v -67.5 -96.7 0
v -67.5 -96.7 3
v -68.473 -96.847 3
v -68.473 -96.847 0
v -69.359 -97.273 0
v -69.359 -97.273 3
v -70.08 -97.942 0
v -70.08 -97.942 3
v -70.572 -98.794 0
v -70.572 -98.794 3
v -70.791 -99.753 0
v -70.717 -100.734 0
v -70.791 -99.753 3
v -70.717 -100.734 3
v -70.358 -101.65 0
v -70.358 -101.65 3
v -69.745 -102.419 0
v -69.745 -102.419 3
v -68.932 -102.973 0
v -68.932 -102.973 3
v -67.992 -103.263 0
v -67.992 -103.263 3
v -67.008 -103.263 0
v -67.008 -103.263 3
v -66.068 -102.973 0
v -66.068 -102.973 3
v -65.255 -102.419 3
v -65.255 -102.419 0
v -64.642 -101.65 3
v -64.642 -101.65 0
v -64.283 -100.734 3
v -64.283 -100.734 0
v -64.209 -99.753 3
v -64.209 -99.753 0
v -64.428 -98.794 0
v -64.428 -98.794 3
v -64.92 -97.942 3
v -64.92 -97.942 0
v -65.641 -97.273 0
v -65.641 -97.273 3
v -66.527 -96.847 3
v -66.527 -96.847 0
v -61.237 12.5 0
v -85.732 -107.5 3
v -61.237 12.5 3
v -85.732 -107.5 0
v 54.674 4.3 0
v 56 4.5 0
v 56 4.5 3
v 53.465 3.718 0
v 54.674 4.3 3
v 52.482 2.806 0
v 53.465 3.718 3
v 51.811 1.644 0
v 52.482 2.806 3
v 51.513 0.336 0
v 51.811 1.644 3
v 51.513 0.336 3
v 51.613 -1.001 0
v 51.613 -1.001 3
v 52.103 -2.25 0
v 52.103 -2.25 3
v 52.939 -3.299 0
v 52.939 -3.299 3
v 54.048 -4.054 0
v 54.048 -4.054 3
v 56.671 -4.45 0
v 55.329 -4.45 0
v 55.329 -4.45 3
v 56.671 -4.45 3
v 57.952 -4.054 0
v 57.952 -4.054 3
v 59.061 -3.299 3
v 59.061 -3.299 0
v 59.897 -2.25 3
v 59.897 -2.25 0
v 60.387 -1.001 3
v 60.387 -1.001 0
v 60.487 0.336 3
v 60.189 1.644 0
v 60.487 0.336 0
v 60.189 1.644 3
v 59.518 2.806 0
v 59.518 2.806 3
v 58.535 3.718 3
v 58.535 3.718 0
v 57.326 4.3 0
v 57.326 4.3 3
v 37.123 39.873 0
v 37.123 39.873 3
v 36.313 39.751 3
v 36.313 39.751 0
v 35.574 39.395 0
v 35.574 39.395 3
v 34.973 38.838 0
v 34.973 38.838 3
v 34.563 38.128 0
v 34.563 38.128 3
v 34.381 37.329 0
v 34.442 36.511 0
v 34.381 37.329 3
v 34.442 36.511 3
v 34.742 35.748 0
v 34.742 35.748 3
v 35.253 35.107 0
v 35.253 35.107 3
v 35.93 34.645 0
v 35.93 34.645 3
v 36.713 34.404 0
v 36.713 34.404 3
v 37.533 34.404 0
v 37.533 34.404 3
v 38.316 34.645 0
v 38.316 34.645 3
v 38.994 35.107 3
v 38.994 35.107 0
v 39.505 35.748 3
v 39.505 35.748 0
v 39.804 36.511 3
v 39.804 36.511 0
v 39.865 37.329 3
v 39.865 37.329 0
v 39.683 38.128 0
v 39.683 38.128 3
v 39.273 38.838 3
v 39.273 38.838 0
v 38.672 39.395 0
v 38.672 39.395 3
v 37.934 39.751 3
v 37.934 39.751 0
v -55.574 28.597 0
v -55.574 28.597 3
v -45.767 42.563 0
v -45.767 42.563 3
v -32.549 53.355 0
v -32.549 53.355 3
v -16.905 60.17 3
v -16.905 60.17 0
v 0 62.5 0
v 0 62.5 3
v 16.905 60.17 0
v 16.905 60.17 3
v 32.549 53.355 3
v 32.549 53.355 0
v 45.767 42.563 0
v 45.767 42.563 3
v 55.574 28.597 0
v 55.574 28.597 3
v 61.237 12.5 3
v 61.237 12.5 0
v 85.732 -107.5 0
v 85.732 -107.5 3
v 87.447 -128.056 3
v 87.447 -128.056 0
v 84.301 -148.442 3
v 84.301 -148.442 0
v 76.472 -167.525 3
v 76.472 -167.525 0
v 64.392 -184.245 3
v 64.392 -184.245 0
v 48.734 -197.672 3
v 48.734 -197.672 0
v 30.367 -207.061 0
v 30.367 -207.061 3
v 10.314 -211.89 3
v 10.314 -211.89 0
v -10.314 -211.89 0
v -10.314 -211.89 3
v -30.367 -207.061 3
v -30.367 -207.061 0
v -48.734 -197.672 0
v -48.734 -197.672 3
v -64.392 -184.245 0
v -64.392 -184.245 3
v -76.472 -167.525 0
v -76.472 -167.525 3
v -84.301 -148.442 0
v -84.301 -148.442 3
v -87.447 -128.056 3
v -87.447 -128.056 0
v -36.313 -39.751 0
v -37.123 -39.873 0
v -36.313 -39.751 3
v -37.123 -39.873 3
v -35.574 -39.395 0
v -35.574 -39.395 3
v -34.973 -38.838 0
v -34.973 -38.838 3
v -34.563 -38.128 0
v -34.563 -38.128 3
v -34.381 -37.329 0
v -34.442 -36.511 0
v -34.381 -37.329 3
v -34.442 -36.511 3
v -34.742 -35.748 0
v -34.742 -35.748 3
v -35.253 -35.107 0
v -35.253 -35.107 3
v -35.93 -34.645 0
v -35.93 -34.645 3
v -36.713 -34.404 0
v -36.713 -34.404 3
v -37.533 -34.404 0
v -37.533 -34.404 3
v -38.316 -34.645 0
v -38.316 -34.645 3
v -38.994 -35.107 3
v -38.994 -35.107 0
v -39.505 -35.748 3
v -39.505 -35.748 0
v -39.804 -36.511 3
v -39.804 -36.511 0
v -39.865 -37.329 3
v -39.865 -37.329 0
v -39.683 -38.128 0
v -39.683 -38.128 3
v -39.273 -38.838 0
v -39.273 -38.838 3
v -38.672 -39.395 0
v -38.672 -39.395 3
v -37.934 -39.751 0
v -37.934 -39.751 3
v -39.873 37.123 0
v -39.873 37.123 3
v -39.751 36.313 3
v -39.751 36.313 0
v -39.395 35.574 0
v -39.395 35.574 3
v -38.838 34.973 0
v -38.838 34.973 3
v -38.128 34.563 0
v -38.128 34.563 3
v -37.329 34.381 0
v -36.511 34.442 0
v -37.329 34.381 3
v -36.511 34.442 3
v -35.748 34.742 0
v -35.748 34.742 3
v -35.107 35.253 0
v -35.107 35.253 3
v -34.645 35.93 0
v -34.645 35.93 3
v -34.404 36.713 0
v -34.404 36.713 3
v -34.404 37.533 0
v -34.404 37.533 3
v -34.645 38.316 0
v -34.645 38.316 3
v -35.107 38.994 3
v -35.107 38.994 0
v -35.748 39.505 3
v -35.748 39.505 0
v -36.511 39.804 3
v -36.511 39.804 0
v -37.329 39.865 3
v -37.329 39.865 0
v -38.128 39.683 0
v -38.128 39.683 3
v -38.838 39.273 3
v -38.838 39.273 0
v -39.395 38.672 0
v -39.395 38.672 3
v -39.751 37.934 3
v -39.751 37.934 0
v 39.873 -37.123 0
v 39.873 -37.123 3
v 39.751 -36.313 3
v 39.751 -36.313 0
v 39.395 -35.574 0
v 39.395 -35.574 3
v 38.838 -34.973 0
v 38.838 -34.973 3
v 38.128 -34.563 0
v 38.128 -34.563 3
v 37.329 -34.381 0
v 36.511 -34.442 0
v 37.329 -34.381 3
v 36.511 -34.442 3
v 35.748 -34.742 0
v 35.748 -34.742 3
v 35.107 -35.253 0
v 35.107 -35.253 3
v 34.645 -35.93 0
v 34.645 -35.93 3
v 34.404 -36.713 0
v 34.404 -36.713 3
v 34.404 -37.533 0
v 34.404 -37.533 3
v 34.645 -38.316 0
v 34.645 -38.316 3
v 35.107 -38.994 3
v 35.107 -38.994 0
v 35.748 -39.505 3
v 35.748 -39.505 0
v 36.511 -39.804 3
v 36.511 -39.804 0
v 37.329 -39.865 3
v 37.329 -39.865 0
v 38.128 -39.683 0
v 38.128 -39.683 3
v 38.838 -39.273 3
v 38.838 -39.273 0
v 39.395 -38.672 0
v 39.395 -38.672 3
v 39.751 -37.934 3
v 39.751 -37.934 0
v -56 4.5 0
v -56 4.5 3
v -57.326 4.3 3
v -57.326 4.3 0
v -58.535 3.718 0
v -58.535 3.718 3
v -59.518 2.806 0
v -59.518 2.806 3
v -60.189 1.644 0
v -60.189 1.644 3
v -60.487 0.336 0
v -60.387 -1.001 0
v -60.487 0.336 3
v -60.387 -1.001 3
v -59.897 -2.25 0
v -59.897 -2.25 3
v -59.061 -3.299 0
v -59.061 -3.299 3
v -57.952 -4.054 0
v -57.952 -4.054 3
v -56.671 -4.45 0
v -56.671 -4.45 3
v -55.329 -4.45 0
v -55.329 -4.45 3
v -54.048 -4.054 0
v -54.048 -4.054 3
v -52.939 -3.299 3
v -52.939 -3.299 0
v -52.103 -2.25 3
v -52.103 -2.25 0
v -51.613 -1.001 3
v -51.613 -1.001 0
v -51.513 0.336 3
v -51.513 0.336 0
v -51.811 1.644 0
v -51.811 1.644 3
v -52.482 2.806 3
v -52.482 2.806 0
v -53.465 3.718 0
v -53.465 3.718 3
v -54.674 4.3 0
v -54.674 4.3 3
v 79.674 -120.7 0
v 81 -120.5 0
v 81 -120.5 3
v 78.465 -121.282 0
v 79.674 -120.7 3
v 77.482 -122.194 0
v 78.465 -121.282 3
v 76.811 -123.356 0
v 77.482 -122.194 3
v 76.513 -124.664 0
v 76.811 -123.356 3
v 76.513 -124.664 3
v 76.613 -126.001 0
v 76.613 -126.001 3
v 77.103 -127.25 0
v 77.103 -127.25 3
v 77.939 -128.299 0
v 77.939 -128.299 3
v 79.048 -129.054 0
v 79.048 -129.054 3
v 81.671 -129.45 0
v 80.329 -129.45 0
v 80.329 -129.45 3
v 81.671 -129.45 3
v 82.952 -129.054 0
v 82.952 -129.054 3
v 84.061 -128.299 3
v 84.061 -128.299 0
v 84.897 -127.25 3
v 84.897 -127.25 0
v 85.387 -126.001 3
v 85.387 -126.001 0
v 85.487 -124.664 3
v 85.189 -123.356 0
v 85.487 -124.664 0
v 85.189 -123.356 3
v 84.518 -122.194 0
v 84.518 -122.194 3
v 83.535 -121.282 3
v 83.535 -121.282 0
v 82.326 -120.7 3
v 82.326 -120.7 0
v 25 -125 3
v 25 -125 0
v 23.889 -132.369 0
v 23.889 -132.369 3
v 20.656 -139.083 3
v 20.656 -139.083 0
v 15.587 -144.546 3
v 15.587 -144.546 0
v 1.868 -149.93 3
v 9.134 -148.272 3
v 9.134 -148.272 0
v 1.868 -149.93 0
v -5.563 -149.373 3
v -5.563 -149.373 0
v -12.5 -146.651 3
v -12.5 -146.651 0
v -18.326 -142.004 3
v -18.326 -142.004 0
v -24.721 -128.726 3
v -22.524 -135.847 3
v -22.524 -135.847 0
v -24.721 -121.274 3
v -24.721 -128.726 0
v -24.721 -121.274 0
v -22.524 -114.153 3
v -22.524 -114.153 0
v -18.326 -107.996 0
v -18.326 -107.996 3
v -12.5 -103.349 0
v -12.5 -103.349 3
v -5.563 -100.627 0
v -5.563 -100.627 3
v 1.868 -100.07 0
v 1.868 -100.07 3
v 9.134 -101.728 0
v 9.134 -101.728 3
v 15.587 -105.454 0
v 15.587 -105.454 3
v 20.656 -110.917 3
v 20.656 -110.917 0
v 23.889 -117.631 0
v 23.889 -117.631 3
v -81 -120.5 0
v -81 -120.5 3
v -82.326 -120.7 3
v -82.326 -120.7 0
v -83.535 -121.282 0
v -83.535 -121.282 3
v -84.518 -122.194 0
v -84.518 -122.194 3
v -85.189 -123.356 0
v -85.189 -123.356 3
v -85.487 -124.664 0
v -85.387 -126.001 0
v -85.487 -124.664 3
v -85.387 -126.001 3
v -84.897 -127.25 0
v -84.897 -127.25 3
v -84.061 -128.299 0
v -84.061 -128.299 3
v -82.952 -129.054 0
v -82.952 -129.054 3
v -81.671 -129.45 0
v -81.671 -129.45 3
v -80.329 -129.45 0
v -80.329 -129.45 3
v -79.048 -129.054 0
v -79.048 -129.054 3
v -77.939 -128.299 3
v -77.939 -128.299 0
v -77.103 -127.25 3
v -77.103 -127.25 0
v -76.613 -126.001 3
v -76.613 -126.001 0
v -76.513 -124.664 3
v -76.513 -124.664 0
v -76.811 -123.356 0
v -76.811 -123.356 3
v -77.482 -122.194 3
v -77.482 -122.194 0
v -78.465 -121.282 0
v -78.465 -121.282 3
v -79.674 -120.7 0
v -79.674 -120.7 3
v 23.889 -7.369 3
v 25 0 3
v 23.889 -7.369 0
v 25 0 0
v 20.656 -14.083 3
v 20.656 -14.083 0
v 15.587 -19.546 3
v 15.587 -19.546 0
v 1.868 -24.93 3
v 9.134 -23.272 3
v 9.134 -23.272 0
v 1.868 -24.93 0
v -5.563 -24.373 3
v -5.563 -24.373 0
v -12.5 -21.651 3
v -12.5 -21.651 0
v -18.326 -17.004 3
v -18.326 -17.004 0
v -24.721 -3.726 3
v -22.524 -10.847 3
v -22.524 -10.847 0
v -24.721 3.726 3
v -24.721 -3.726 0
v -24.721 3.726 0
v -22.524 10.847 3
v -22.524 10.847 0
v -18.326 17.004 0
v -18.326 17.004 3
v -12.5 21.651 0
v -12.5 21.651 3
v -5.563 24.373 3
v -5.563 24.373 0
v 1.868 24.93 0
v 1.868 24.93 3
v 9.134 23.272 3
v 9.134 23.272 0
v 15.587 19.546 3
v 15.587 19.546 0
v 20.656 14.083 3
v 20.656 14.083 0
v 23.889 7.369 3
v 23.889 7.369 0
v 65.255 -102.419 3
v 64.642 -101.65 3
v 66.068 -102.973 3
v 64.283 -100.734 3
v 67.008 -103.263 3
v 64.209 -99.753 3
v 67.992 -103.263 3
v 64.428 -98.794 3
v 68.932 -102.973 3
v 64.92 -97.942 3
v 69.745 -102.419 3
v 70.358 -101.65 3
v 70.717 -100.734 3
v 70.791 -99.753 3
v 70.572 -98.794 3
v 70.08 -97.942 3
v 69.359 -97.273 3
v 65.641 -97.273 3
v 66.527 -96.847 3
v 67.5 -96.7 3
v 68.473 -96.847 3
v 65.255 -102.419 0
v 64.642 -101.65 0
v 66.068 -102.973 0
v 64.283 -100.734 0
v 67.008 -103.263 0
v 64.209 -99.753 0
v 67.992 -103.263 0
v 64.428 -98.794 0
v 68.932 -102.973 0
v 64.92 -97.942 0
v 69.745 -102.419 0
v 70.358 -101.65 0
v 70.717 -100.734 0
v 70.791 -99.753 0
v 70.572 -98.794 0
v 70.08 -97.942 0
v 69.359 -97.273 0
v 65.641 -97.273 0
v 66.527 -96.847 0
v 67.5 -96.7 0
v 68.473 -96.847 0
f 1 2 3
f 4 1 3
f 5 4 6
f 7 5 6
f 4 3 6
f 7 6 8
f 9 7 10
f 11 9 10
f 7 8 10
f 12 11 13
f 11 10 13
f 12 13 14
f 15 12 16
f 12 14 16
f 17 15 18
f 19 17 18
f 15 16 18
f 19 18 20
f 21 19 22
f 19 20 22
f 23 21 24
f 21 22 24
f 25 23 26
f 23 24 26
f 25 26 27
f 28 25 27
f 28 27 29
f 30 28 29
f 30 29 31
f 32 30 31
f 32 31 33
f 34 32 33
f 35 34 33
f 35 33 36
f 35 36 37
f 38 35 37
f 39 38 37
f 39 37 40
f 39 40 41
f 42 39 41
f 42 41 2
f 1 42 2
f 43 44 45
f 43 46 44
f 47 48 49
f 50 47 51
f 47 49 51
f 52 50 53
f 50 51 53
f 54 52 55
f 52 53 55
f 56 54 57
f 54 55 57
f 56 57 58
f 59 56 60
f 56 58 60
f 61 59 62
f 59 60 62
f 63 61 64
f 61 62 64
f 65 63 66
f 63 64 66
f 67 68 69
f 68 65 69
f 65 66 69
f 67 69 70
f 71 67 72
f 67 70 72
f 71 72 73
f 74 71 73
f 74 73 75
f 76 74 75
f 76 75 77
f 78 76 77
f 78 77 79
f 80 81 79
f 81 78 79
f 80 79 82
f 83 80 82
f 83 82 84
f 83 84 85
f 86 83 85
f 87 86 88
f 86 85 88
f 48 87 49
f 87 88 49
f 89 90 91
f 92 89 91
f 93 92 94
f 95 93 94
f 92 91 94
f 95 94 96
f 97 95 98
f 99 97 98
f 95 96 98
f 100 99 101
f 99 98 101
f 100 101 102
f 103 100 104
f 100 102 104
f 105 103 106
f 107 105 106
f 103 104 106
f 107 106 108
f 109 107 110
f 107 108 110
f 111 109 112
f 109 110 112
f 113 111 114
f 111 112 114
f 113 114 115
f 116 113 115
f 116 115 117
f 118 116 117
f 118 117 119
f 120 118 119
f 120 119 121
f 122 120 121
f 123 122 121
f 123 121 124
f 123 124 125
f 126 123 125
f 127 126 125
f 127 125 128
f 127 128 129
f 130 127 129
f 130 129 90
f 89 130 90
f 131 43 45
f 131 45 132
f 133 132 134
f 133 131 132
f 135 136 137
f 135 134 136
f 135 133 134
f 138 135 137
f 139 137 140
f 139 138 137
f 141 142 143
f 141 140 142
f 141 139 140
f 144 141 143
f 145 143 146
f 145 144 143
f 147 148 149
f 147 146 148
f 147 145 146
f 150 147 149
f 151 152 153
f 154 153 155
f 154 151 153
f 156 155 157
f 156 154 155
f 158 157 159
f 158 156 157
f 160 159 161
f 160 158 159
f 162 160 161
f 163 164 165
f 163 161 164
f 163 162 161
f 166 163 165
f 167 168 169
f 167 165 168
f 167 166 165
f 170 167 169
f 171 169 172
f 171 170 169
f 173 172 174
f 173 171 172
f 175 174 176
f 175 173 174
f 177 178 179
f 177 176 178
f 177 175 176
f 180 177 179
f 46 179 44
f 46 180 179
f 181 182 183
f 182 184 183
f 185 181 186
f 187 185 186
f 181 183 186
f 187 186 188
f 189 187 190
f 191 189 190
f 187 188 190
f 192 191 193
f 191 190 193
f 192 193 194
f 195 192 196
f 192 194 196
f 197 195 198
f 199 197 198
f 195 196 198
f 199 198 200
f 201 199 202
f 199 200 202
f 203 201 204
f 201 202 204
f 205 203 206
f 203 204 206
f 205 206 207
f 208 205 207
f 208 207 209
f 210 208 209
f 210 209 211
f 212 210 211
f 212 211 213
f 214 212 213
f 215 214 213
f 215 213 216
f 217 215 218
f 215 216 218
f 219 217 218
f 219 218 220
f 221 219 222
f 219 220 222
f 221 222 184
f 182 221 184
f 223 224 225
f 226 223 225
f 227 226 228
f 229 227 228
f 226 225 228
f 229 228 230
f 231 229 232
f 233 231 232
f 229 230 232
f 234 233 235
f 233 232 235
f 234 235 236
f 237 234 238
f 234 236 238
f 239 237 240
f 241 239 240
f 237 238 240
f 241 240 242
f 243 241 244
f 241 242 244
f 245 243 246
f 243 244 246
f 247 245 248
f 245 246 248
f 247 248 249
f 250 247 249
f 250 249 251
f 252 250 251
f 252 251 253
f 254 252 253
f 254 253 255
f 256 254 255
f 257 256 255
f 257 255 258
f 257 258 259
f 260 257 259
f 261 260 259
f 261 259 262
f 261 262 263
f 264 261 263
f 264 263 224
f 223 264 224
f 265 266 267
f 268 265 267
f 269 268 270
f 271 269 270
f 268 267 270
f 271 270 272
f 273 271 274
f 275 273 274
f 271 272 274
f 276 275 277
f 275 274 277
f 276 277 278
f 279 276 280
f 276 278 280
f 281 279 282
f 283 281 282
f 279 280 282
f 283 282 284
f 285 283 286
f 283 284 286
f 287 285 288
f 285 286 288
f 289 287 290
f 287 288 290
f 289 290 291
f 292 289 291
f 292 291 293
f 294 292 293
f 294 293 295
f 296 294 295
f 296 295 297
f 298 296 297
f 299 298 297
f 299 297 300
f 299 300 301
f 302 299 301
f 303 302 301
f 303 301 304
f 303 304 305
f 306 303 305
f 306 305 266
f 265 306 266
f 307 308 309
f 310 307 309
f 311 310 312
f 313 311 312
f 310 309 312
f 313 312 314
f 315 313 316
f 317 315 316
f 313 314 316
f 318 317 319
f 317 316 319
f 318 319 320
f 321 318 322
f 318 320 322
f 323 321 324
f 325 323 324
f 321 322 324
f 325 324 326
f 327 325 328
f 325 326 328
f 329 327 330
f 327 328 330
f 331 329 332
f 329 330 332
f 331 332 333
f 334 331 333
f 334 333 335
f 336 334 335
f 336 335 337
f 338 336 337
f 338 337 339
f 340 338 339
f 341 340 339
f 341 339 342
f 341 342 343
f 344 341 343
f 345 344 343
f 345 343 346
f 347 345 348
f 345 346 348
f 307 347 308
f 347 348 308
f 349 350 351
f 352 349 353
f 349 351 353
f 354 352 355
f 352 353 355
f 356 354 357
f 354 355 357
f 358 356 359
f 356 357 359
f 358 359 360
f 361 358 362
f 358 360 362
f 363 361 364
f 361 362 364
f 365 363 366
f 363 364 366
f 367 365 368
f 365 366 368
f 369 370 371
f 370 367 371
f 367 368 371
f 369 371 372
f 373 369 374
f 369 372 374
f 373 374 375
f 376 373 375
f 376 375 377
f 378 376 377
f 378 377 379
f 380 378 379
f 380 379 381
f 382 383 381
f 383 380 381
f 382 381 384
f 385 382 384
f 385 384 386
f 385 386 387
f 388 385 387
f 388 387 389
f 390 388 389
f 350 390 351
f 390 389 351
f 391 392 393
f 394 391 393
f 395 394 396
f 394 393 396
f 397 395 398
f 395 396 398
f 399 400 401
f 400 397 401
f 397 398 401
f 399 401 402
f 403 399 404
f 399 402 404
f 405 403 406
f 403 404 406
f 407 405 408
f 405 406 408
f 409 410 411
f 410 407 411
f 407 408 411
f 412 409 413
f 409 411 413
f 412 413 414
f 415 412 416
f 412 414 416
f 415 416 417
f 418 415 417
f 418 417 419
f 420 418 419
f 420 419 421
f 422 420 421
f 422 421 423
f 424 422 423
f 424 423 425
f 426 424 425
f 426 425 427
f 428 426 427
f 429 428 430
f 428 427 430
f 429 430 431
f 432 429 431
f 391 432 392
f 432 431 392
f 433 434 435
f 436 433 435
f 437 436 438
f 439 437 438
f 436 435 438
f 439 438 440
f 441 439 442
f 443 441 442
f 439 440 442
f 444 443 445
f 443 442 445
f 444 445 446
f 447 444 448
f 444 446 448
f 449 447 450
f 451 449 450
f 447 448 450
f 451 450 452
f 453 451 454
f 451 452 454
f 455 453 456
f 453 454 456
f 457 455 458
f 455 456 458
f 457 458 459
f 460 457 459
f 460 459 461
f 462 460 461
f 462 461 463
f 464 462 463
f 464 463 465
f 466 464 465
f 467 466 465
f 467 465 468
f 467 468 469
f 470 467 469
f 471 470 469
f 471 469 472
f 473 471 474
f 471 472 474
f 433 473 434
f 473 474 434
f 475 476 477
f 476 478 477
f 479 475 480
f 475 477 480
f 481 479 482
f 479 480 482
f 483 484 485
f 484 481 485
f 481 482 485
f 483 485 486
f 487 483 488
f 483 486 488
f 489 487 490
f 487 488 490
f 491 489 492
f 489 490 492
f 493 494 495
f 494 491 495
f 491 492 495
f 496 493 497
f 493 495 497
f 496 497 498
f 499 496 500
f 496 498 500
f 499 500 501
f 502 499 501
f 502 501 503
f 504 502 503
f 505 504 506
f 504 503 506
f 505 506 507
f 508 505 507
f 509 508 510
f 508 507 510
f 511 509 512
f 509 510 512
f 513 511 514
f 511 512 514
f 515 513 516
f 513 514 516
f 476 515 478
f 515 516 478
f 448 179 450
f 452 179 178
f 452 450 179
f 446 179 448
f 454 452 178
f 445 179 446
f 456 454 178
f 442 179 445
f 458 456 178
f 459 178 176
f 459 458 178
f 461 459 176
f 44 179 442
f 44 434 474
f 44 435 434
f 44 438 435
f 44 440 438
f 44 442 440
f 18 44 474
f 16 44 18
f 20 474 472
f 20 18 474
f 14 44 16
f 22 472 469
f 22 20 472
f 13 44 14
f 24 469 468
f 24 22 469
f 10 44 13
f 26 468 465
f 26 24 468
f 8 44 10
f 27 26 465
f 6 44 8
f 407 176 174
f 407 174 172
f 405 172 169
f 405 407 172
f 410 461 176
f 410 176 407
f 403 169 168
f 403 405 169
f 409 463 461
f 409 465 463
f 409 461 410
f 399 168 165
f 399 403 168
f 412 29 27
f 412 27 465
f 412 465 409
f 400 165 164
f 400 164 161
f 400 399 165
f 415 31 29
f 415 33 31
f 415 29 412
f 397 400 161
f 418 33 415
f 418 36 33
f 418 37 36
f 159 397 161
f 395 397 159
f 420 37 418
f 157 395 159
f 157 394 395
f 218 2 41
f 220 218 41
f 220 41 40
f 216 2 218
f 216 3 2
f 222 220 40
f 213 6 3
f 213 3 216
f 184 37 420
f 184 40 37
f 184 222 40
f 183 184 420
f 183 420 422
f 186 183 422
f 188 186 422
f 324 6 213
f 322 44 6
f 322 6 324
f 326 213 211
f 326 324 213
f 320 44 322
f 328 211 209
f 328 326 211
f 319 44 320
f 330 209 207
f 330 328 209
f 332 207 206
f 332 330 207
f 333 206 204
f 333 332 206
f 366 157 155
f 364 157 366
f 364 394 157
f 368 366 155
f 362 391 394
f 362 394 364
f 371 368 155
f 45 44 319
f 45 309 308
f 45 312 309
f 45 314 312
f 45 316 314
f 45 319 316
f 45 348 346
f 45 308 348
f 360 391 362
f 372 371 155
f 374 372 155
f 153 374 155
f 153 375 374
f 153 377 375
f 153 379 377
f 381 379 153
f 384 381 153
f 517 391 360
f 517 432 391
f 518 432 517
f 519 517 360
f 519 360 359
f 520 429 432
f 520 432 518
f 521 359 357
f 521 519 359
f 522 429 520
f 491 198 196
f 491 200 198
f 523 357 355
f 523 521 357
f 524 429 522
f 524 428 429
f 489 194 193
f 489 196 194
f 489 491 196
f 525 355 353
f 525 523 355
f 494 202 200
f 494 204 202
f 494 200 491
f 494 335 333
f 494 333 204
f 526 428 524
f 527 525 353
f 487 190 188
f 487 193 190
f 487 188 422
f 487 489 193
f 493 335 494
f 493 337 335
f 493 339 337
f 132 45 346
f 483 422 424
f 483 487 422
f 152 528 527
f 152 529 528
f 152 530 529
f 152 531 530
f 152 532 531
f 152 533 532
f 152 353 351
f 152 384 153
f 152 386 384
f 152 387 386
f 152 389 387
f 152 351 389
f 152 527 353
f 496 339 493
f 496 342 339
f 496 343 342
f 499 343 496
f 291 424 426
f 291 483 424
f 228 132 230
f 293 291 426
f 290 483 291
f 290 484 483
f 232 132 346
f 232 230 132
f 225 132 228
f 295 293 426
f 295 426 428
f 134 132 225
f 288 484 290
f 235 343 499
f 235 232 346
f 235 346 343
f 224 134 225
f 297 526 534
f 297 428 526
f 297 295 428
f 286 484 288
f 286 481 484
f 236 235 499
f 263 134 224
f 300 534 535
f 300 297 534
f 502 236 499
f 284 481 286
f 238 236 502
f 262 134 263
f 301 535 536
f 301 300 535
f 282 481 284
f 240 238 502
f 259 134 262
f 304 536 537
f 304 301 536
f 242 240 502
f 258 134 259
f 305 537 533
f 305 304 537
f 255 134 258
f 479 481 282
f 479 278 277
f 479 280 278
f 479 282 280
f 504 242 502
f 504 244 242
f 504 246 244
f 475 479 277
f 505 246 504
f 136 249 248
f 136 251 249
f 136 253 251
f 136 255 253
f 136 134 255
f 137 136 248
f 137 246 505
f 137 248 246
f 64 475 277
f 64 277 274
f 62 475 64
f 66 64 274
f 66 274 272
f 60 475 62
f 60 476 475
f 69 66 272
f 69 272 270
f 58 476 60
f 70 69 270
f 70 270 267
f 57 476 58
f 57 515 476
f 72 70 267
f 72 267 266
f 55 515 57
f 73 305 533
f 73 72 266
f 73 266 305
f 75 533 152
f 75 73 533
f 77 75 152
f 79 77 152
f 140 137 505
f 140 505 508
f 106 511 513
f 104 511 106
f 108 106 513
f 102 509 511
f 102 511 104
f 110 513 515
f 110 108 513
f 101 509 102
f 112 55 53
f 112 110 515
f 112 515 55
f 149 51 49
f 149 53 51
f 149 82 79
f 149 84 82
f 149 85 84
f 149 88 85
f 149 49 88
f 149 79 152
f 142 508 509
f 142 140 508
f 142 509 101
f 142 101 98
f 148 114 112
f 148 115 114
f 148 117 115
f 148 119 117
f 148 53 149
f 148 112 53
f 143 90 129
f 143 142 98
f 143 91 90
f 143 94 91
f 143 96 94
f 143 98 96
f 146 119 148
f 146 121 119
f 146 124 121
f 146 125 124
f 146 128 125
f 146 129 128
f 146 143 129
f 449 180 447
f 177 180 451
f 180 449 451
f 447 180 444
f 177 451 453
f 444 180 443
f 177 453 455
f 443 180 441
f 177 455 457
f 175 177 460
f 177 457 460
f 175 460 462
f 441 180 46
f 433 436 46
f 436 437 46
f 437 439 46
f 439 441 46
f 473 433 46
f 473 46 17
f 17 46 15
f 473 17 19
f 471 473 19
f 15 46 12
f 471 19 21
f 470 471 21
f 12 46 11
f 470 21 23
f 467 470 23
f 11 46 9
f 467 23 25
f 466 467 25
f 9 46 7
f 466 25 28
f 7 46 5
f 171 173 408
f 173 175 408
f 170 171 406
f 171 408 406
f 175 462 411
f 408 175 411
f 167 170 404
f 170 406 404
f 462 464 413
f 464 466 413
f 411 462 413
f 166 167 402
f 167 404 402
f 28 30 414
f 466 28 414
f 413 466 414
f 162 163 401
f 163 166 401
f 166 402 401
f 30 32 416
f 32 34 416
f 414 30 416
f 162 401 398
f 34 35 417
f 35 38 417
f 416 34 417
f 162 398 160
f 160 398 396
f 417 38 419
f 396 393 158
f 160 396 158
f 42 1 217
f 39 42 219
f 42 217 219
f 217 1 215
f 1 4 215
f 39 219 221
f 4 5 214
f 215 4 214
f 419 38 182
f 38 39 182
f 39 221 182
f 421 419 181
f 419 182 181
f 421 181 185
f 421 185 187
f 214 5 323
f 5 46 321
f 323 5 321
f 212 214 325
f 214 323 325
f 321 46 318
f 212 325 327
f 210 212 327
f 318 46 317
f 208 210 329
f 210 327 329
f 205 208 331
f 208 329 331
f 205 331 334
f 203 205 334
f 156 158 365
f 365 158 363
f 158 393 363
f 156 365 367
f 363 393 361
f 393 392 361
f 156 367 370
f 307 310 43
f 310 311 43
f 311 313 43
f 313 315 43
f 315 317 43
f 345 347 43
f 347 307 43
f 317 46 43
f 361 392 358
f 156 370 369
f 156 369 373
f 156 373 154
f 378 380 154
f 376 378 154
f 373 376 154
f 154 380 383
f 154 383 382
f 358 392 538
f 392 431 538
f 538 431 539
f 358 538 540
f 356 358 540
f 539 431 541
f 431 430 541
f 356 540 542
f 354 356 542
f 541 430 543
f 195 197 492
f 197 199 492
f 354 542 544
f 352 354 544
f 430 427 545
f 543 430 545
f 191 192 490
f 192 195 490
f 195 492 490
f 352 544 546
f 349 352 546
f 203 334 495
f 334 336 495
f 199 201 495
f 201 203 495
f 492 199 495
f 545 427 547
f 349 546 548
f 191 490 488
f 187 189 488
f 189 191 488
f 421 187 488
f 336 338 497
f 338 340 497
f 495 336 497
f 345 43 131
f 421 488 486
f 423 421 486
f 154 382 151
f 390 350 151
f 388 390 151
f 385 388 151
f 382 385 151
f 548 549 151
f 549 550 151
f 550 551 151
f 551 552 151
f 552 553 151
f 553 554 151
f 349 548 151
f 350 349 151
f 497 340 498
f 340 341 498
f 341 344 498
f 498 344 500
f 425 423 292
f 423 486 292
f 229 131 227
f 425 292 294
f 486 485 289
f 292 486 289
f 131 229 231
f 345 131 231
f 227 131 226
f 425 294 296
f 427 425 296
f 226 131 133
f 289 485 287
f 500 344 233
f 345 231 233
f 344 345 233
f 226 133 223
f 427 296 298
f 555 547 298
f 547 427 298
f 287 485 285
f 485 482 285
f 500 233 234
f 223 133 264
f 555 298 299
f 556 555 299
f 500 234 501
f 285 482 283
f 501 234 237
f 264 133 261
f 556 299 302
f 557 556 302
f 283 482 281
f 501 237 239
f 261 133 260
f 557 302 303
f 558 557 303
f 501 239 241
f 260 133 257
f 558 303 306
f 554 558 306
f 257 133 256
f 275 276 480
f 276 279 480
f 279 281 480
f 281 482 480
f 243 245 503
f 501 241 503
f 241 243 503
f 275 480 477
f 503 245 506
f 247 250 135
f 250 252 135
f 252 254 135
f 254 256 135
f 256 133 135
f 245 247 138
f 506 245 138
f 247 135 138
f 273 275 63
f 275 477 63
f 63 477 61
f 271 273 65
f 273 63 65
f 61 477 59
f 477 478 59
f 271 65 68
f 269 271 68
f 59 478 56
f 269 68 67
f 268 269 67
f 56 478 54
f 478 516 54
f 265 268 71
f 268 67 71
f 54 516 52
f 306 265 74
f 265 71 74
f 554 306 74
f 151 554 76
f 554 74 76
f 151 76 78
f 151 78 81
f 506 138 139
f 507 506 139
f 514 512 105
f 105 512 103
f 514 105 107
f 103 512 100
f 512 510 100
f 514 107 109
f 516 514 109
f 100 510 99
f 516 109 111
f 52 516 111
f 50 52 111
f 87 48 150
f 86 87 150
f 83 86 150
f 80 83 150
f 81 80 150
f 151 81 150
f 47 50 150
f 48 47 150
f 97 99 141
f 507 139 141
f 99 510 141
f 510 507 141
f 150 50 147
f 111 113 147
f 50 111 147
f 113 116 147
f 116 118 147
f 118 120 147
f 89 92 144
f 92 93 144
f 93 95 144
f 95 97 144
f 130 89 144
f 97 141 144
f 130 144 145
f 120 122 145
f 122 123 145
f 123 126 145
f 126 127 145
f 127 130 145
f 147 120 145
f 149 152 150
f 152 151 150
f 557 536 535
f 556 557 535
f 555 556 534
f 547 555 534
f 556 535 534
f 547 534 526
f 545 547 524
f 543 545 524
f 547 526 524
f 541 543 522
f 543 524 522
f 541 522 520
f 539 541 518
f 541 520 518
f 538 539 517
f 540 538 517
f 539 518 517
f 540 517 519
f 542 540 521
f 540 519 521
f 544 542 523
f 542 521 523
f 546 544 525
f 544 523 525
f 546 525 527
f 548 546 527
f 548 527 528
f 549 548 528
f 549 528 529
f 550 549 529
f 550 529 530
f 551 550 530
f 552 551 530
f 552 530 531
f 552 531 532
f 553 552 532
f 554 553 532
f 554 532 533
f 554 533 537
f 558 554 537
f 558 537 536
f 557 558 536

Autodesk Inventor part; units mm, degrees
ref_plane "YZ Plane" through (0, 0, 0) normal (1, 0, 0) x (0, 1, 0)
ref_plane "XZ Plane" through (0, 0, 0) normal (0, 1, 0) x (-1, 0, 0)
ref_plane "XY Plane" through (0, 0, 0) normal (0, 0, 1) x (1, 0, 0)
sketch "Sketch1" plane through (0, 0, 0) normal (0, 0, 1) x (1, 0, 0)
  circle A0 centre (0, 0) radius 52.5 construction
  circle A1 centre (0, 0) radius 25
  circle A2 centre (0, 0) radius 62.5
  line L0 (0, 0) -> (0, 52.5) construction
  line L1 (0, 0) -> (37.1231, 37.1231) construction
  line L2 (0, 0) -> (0, -125) construction
  circle A3 centre (0, -125) radius 87.5
  line L3 (-85.7321, -107.5) -> (-61.2372, 12.5)
  line L4 (85.7321, -107.5) -> (61.2372, 12.5)
  circle A4 centre (0, -125) radius 25
  circle A5 centre (0, -125) radius 81 construction
  circle A6 centre (0, 0) radius 56 construction
  line L5 (0, 0) -> (-56, 0) construction
  line L6 (0, -125) -> (-81, -125) construction
  dimension "d31" = 162
  dimension "d32" = 112
  dimension "d0" = 105
  dimension "d1" = 50
  dimension "d2" = 125
  dimension "d3" = 45
  dimension "d4" = 125
  dimension "d5" = 175
  dimension "d6" = 50
extrude "Extrusion1" add sketch "Sketch1" along normal blind 3
sketch "Sketch2" plane through (0, 0, 0) normal (0, 0, 1) x (1, 0, 0)
  line L0 (0, 0) -> (0, -100)
  line L1 (67.5, -100) -> (-67.5, -100)
  arc A0 (-85.7321, -107.5) -> (85.7321, -107.5) centre (0, -125) ccw projected
  dimension "d11" = 100
  dimension "d12" = 135
  dimension "d40" = 25
hole "Hole1" at (67.5, -100, 0) at (-67.5, -100, 0) direction (0, 0, 1) diameter 6.6 end through all clearance for "Hex Head Cap Screw ISO 24017" size "M6" standard "ISO"
hole "Hole2" at (37.1231, 37.1231, 0) direction (0, 0, 1) diameter 5.5 end through all clearance for "Hex Head Cap Screw ISO 24017" size "M5" standard "ISO"
pattern_circular "Circular Pattern1" count 4 over 360 about axis through (0, 0, 0) along (0, 0, 1) of "Hole2"
hole "Hole3" at (-56, 0, 0) at (-81, -125, 0) direction (0, 0, 1) diameter 9 end through all
mirror "Mirror1" about plane through (0, 0, 0) normal (1, 0, 0) of "Hole3"
properties part number "PWTR-0128" material "Aluminum 6061"
